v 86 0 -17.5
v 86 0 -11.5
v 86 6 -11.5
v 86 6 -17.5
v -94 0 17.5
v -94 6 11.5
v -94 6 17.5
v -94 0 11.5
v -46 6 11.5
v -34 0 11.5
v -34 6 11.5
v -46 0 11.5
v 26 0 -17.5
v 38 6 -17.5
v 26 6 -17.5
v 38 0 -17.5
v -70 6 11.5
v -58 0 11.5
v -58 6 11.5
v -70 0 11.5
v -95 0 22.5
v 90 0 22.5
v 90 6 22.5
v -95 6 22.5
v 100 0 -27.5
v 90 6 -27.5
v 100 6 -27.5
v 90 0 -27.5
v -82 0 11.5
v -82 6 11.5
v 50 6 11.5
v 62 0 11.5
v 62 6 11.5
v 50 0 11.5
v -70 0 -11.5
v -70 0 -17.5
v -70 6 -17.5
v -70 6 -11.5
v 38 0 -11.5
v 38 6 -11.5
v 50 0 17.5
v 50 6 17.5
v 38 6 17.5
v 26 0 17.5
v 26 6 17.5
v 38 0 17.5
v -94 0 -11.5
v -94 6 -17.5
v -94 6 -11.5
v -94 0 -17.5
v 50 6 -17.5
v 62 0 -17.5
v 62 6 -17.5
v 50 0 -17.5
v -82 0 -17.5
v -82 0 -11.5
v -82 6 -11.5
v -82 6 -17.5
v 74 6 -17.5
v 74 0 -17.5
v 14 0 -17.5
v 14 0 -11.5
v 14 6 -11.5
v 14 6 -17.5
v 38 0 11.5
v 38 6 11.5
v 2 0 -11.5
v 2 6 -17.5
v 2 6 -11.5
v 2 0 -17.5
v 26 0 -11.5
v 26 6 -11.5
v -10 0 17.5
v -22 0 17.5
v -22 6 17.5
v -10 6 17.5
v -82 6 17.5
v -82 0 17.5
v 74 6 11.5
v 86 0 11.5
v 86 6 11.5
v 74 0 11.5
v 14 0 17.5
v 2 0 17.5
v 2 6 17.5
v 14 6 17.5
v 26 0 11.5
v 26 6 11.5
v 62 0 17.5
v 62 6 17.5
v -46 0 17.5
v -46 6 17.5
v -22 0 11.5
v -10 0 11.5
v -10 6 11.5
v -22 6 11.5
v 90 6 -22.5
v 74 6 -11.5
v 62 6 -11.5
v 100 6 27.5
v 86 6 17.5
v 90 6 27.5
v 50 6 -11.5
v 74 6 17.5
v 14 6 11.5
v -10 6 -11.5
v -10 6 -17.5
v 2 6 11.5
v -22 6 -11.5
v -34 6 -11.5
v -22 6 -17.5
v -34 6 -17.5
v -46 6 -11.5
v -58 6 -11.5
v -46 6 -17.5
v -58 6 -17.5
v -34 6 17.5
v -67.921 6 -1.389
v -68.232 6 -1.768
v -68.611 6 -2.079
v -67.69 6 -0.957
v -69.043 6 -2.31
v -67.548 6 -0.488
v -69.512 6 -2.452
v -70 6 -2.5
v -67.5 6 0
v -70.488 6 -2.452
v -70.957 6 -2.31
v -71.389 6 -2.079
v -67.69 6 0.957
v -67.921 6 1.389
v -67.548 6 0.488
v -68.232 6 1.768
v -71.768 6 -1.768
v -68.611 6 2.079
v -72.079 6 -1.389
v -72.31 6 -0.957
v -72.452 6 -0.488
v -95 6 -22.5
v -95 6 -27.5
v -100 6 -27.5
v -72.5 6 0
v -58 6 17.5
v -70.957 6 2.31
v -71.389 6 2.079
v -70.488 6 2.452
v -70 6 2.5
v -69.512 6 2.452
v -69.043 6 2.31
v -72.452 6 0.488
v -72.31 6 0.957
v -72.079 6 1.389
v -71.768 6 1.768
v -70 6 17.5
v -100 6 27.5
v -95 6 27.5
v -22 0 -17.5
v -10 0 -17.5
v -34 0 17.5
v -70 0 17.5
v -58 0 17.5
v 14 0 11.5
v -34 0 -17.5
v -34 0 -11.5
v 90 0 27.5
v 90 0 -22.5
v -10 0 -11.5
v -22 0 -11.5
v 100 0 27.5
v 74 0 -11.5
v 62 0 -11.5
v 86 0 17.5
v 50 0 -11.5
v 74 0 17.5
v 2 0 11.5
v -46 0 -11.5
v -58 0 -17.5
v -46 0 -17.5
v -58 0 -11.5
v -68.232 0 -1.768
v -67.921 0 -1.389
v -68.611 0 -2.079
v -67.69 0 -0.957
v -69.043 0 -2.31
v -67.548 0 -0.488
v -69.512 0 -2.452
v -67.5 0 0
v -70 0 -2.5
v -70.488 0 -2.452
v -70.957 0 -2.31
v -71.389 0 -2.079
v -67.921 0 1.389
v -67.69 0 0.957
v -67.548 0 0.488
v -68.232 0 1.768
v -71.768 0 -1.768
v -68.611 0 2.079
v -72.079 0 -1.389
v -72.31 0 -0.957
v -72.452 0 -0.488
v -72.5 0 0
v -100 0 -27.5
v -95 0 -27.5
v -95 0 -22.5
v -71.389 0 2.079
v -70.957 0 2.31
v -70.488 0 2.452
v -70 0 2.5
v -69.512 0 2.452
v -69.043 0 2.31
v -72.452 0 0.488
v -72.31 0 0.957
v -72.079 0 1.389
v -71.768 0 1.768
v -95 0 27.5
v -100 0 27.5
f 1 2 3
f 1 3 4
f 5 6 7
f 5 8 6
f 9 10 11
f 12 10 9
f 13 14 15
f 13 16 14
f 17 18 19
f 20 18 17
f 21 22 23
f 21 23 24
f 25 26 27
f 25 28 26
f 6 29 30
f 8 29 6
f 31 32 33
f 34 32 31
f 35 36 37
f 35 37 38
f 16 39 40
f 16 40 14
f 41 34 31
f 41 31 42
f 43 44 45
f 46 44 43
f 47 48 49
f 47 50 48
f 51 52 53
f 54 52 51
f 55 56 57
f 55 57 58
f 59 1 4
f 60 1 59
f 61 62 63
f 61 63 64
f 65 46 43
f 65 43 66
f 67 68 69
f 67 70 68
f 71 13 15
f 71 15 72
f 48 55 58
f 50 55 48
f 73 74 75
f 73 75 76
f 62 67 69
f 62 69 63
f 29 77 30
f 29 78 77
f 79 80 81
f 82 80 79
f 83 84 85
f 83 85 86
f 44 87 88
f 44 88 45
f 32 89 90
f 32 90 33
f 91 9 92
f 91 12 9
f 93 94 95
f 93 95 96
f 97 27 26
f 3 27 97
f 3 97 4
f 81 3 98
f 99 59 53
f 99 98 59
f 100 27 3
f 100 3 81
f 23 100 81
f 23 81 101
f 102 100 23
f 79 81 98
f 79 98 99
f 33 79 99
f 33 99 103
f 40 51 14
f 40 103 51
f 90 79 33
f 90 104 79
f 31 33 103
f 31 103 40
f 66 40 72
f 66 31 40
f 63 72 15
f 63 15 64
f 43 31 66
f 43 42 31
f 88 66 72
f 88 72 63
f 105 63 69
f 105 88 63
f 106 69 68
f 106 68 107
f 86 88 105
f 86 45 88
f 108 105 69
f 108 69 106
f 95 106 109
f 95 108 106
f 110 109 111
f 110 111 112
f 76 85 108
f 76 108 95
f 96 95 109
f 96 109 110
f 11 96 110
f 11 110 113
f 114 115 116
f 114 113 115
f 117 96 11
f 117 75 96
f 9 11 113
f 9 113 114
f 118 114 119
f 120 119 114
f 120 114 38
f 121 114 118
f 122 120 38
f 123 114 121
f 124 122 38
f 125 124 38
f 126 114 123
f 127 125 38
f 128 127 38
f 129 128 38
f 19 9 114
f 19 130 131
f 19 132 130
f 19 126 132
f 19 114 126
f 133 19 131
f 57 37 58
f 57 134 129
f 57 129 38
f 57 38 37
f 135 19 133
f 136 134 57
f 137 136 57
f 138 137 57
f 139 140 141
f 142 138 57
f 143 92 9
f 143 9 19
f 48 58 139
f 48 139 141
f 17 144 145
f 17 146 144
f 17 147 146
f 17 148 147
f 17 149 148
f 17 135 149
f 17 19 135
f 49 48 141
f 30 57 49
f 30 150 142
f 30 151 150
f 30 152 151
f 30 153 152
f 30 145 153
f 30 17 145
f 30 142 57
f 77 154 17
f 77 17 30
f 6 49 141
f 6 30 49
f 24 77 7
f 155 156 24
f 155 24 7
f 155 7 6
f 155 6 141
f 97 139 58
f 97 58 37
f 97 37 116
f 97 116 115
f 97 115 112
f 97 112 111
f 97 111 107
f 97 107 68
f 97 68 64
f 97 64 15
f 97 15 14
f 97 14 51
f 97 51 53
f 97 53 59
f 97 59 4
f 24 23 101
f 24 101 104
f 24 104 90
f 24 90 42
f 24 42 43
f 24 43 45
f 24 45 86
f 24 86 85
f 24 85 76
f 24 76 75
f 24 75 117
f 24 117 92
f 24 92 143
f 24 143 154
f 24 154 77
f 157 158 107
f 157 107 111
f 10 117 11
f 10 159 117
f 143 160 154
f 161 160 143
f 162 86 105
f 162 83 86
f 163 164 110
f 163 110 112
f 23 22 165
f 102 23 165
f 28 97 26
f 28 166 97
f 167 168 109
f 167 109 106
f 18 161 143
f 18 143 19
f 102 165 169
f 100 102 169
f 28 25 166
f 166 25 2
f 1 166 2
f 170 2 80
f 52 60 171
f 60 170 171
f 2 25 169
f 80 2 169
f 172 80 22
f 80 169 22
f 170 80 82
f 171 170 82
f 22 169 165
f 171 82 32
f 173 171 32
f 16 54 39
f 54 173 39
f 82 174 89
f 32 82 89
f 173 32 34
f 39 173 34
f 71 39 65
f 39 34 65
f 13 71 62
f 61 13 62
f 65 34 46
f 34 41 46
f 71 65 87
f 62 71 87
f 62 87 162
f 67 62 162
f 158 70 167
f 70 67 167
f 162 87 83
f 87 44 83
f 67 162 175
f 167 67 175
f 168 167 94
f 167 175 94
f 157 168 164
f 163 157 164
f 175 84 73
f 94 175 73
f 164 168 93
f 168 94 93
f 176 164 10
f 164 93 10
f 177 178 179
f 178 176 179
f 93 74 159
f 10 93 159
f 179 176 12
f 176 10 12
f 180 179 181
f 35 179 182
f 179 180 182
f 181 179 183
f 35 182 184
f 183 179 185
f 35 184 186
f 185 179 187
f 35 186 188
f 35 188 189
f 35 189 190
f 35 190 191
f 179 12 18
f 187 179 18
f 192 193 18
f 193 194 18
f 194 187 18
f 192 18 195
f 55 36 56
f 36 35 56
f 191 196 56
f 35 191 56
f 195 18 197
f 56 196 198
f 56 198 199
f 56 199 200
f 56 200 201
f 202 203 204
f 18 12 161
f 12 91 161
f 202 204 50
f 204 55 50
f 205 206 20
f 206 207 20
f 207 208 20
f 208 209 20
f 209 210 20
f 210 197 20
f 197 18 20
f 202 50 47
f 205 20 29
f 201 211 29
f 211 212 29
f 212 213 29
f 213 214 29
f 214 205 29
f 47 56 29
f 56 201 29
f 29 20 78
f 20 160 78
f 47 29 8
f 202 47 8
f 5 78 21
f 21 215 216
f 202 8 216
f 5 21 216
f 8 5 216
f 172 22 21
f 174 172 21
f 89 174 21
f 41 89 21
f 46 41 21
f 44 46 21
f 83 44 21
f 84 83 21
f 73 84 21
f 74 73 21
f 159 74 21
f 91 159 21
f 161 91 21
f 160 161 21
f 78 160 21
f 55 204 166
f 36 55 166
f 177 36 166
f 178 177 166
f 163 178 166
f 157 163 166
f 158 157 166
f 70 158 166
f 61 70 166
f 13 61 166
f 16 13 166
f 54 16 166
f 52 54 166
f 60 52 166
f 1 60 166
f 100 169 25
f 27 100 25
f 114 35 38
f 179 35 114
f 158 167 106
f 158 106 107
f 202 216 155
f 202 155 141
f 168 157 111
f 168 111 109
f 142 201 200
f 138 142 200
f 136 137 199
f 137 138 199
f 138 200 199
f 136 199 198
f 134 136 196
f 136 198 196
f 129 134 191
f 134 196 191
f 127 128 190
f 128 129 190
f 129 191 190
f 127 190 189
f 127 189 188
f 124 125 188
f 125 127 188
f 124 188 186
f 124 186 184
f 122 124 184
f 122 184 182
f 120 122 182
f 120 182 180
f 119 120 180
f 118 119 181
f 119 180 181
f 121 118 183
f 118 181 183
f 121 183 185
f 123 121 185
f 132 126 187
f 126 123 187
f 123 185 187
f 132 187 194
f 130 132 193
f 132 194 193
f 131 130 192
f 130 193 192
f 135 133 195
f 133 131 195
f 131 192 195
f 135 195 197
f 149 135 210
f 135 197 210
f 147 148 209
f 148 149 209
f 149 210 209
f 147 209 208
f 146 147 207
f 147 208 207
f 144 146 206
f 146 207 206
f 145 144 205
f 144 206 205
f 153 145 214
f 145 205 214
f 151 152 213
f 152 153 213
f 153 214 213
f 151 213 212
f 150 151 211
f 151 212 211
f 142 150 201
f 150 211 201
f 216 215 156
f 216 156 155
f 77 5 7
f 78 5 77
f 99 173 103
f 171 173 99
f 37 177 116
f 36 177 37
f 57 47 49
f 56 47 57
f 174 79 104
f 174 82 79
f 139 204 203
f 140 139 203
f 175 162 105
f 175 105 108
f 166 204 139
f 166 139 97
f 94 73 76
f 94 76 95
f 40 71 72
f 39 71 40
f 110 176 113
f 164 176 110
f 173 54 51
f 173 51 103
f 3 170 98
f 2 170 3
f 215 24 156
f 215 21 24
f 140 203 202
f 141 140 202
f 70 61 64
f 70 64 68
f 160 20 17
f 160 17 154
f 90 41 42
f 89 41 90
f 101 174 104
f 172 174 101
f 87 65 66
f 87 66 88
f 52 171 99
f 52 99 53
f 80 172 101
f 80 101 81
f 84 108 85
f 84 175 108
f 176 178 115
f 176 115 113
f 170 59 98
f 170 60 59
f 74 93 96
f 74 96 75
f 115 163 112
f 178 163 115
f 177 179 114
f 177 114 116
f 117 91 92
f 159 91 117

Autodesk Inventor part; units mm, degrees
ref_plane "YZ Plane" through (0, 0, 0) normal (1, 0, 0) x (0, 1, 0)
ref_plane "XZ Plane" through (0, 0, 0) normal (0, 1, 0) x (-1, 0, 0)
ref_plane "XY Plane" through (0, 0, 0) normal (0, 0, 1) x (1, 0, 0)
sketch "Sketch2" plane through (0, 0, 0) normal (0, 1, 0) x (-1, 0, 0)
  line L0 (-100, 22.5) -> (100, 22.5)
  line L1 (100, 22.5) -> (100, -22.5)
  line L2 (100, -22.5) -> (-100, -22.5)
  line L3 (-100, -22.5) -> (-100, 22.5)
  line L4 (-100, 22.5) -> (100, -22.5) construction
  line L5 (100, 22.5) -> (-100, -22.5) construction
  line L6 (100, 22.5) -> (95, 22.5)
  line L7 (95, 22.5) -> (95, 27.5)
  line L8 (95, 27.5) -> (100, 27.5)
  line L9 (100, 27.5) -> (100, 22.5)
  line L10 (100, -22.5) -> (95, -22.5)
  line L11 (95, -22.5) -> (95, -27.5)
  line L12 (95, -27.5) -> (100, -27.5)
  line L13 (100, -27.5) -> (100, -22.5)
  line L14 (-100, -22.5) -> (-90, -22.5)
  line L15 (-90, -22.5) -> (-90, -27.5)
  line L16 (-90, -27.5) -> (-100, -27.5)
  line L17 (-100, -27.5) -> (-100, -22.5)
  line L18 (-100, 22.5) -> (-90, 22.5)
  line L19 (-90, 22.5) -> (-90, 27.5)
  line L20 (-90, 27.5) -> (-100, 27.5)
  line L21 (-100, 27.5) -> (-100, 22.5)
  line L22 (94, 17.5) -> (82, 17.5)
  line L23 (82, 17.5) -> (82, 11.5)
  line L24 (82, 11.5) -> (94, 11.5)
  line L25 (94, 11.5) -> (94, 17.5)
  line L26 (70, 17.5) -> (58, 17.5)
  line L27 (70, 11.5) -> (70, 17.5)
  line L28 (58, 11.5) -> (70, 11.5)
  line L29 (58, 17.5) -> (58, 11.5)
  line L30 (46, 17.5) -> (34, 17.5)
  line L31 (46, 11.5) -> (46, 17.5)
  line L32 (34, 11.5) -> (46, 11.5)
  line L33 (34, 17.5) -> (34, 11.5)
  line L34 (22, 17.5) -> (10, 17.5)
  line L35 (22, 11.5) -> (22, 17.5)
  line L36 (10, 11.5) -> (22, 11.5)
  line L37 (10, 17.5) -> (10, 11.5)
  line L38 (-2, 17.5) -> (-14, 17.5)
  line L39 (-2, 11.5) -> (-2, 17.5)
  line L40 (-14, 11.5) -> (-2, 11.5)
  line L41 (-14, 17.5) -> (-14, 11.5)
  line L42 (-26, 17.5) -> (-38, 17.5)
  line L43 (-26, 11.5) -> (-26, 17.5)
  line L44 (-38, 11.5) -> (-26, 11.5)
  line L45 (-38, 17.5) -> (-38, 11.5)
  line L46 (-50, 17.5) -> (-62, 17.5)
  line L47 (-50, 11.5) -> (-50, 17.5)
  line L48 (-62, 11.5) -> (-50, 11.5)
  line L49 (-62, 17.5) -> (-62, 11.5)
  line L50 (-74, 17.5) -> (-86, 17.5)
  line L51 (-74, 11.5) -> (-74, 17.5)
  line L52 (-86, 11.5) -> (-74, 11.5)
  line L53 (-86, 17.5) -> (-86, 11.5)
  line L54 (94, -11.5) -> (82, -11.5)
  line L55 (94, -17.5) -> (94, -11.5)
  line L56 (82, -17.5) -> (94, -17.5)
  line L57 (82, -11.5) -> (82, -17.5)
  line L58 (70, -11.5) -> (58, -11.5)
  line L59 (70, -17.5) -> (70, -11.5)
  line L60 (58, -17.5) -> (70, -17.5)
  line L61 (58, -11.5) -> (58, -17.5)
  line L62 (46, -11.5) -> (34, -11.5)
  line L63 (46, -17.5) -> (46, -11.5)
  line L64 (34, -17.5) -> (46, -17.5)
  line L65 (34, -11.5) -> (34, -17.5)
  line L66 (22, -11.5) -> (10, -11.5)
  line L67 (22, -17.5) -> (22, -11.5)
  line L68 (10, -17.5) -> (22, -17.5)
  line L69 (10, -11.5) -> (10, -17.5)
  line L70 (-2, -11.5) -> (-14, -11.5)
  line L71 (-2, -17.5) -> (-2, -11.5)
  line L72 (-14, -17.5) -> (-2, -17.5)
  line L73 (-14, -11.5) -> (-14, -17.5)
  line L74 (-26, -11.5) -> (-38, -11.5)
  line L75 (-26, -17.5) -> (-26, -11.5)
  line L76 (-38, -17.5) -> (-26, -17.5)
  line L77 (-38, -11.5) -> (-38, -17.5)
  line L78 (-50, -11.5) -> (-62, -11.5)
  line L79 (-50, -17.5) -> (-50, -11.5)
  line L80 (-62, -17.5) -> (-50, -17.5)
  line L81 (-62, -11.5) -> (-62, -17.5)
  line L82 (-74, -11.5) -> (-86, -11.5)
  line L83 (-74, -17.5) -> (-74, -11.5)
  line L84 (-86, -17.5) -> (-74, -17.5)
  line L85 (-86, -11.5) -> (-86, -17.5)
  circle A0 centre (70, 0) radius 2.5
  point P0 (0, 0)
  point P1 (0, 0)
  dimension "d9" = 45
  dimension "d10" = 200
  dimension "d11" = 5
  dimension "d12" = 5
  dimension "d13" = 5
  dimension "d14" = 5
  dimension "d15" = 10
  dimension "d16" = 5
  dimension "d17" = 10
  dimension "d18" = 5
  dimension "d19" = 12
  dimension "d20" = 6
  dimension "d21" = 6
  dimension "d22" = 5
  dimension "d25" = 24
  dimension "d28" = 29
  dimension "d33" = 5
  dimension "d35" = 25
extrude "Extrusion2" add sketch "Sketch2" along normal blind 6
properties part number "phone_holder_slider" material "Acrylic, Clear"
